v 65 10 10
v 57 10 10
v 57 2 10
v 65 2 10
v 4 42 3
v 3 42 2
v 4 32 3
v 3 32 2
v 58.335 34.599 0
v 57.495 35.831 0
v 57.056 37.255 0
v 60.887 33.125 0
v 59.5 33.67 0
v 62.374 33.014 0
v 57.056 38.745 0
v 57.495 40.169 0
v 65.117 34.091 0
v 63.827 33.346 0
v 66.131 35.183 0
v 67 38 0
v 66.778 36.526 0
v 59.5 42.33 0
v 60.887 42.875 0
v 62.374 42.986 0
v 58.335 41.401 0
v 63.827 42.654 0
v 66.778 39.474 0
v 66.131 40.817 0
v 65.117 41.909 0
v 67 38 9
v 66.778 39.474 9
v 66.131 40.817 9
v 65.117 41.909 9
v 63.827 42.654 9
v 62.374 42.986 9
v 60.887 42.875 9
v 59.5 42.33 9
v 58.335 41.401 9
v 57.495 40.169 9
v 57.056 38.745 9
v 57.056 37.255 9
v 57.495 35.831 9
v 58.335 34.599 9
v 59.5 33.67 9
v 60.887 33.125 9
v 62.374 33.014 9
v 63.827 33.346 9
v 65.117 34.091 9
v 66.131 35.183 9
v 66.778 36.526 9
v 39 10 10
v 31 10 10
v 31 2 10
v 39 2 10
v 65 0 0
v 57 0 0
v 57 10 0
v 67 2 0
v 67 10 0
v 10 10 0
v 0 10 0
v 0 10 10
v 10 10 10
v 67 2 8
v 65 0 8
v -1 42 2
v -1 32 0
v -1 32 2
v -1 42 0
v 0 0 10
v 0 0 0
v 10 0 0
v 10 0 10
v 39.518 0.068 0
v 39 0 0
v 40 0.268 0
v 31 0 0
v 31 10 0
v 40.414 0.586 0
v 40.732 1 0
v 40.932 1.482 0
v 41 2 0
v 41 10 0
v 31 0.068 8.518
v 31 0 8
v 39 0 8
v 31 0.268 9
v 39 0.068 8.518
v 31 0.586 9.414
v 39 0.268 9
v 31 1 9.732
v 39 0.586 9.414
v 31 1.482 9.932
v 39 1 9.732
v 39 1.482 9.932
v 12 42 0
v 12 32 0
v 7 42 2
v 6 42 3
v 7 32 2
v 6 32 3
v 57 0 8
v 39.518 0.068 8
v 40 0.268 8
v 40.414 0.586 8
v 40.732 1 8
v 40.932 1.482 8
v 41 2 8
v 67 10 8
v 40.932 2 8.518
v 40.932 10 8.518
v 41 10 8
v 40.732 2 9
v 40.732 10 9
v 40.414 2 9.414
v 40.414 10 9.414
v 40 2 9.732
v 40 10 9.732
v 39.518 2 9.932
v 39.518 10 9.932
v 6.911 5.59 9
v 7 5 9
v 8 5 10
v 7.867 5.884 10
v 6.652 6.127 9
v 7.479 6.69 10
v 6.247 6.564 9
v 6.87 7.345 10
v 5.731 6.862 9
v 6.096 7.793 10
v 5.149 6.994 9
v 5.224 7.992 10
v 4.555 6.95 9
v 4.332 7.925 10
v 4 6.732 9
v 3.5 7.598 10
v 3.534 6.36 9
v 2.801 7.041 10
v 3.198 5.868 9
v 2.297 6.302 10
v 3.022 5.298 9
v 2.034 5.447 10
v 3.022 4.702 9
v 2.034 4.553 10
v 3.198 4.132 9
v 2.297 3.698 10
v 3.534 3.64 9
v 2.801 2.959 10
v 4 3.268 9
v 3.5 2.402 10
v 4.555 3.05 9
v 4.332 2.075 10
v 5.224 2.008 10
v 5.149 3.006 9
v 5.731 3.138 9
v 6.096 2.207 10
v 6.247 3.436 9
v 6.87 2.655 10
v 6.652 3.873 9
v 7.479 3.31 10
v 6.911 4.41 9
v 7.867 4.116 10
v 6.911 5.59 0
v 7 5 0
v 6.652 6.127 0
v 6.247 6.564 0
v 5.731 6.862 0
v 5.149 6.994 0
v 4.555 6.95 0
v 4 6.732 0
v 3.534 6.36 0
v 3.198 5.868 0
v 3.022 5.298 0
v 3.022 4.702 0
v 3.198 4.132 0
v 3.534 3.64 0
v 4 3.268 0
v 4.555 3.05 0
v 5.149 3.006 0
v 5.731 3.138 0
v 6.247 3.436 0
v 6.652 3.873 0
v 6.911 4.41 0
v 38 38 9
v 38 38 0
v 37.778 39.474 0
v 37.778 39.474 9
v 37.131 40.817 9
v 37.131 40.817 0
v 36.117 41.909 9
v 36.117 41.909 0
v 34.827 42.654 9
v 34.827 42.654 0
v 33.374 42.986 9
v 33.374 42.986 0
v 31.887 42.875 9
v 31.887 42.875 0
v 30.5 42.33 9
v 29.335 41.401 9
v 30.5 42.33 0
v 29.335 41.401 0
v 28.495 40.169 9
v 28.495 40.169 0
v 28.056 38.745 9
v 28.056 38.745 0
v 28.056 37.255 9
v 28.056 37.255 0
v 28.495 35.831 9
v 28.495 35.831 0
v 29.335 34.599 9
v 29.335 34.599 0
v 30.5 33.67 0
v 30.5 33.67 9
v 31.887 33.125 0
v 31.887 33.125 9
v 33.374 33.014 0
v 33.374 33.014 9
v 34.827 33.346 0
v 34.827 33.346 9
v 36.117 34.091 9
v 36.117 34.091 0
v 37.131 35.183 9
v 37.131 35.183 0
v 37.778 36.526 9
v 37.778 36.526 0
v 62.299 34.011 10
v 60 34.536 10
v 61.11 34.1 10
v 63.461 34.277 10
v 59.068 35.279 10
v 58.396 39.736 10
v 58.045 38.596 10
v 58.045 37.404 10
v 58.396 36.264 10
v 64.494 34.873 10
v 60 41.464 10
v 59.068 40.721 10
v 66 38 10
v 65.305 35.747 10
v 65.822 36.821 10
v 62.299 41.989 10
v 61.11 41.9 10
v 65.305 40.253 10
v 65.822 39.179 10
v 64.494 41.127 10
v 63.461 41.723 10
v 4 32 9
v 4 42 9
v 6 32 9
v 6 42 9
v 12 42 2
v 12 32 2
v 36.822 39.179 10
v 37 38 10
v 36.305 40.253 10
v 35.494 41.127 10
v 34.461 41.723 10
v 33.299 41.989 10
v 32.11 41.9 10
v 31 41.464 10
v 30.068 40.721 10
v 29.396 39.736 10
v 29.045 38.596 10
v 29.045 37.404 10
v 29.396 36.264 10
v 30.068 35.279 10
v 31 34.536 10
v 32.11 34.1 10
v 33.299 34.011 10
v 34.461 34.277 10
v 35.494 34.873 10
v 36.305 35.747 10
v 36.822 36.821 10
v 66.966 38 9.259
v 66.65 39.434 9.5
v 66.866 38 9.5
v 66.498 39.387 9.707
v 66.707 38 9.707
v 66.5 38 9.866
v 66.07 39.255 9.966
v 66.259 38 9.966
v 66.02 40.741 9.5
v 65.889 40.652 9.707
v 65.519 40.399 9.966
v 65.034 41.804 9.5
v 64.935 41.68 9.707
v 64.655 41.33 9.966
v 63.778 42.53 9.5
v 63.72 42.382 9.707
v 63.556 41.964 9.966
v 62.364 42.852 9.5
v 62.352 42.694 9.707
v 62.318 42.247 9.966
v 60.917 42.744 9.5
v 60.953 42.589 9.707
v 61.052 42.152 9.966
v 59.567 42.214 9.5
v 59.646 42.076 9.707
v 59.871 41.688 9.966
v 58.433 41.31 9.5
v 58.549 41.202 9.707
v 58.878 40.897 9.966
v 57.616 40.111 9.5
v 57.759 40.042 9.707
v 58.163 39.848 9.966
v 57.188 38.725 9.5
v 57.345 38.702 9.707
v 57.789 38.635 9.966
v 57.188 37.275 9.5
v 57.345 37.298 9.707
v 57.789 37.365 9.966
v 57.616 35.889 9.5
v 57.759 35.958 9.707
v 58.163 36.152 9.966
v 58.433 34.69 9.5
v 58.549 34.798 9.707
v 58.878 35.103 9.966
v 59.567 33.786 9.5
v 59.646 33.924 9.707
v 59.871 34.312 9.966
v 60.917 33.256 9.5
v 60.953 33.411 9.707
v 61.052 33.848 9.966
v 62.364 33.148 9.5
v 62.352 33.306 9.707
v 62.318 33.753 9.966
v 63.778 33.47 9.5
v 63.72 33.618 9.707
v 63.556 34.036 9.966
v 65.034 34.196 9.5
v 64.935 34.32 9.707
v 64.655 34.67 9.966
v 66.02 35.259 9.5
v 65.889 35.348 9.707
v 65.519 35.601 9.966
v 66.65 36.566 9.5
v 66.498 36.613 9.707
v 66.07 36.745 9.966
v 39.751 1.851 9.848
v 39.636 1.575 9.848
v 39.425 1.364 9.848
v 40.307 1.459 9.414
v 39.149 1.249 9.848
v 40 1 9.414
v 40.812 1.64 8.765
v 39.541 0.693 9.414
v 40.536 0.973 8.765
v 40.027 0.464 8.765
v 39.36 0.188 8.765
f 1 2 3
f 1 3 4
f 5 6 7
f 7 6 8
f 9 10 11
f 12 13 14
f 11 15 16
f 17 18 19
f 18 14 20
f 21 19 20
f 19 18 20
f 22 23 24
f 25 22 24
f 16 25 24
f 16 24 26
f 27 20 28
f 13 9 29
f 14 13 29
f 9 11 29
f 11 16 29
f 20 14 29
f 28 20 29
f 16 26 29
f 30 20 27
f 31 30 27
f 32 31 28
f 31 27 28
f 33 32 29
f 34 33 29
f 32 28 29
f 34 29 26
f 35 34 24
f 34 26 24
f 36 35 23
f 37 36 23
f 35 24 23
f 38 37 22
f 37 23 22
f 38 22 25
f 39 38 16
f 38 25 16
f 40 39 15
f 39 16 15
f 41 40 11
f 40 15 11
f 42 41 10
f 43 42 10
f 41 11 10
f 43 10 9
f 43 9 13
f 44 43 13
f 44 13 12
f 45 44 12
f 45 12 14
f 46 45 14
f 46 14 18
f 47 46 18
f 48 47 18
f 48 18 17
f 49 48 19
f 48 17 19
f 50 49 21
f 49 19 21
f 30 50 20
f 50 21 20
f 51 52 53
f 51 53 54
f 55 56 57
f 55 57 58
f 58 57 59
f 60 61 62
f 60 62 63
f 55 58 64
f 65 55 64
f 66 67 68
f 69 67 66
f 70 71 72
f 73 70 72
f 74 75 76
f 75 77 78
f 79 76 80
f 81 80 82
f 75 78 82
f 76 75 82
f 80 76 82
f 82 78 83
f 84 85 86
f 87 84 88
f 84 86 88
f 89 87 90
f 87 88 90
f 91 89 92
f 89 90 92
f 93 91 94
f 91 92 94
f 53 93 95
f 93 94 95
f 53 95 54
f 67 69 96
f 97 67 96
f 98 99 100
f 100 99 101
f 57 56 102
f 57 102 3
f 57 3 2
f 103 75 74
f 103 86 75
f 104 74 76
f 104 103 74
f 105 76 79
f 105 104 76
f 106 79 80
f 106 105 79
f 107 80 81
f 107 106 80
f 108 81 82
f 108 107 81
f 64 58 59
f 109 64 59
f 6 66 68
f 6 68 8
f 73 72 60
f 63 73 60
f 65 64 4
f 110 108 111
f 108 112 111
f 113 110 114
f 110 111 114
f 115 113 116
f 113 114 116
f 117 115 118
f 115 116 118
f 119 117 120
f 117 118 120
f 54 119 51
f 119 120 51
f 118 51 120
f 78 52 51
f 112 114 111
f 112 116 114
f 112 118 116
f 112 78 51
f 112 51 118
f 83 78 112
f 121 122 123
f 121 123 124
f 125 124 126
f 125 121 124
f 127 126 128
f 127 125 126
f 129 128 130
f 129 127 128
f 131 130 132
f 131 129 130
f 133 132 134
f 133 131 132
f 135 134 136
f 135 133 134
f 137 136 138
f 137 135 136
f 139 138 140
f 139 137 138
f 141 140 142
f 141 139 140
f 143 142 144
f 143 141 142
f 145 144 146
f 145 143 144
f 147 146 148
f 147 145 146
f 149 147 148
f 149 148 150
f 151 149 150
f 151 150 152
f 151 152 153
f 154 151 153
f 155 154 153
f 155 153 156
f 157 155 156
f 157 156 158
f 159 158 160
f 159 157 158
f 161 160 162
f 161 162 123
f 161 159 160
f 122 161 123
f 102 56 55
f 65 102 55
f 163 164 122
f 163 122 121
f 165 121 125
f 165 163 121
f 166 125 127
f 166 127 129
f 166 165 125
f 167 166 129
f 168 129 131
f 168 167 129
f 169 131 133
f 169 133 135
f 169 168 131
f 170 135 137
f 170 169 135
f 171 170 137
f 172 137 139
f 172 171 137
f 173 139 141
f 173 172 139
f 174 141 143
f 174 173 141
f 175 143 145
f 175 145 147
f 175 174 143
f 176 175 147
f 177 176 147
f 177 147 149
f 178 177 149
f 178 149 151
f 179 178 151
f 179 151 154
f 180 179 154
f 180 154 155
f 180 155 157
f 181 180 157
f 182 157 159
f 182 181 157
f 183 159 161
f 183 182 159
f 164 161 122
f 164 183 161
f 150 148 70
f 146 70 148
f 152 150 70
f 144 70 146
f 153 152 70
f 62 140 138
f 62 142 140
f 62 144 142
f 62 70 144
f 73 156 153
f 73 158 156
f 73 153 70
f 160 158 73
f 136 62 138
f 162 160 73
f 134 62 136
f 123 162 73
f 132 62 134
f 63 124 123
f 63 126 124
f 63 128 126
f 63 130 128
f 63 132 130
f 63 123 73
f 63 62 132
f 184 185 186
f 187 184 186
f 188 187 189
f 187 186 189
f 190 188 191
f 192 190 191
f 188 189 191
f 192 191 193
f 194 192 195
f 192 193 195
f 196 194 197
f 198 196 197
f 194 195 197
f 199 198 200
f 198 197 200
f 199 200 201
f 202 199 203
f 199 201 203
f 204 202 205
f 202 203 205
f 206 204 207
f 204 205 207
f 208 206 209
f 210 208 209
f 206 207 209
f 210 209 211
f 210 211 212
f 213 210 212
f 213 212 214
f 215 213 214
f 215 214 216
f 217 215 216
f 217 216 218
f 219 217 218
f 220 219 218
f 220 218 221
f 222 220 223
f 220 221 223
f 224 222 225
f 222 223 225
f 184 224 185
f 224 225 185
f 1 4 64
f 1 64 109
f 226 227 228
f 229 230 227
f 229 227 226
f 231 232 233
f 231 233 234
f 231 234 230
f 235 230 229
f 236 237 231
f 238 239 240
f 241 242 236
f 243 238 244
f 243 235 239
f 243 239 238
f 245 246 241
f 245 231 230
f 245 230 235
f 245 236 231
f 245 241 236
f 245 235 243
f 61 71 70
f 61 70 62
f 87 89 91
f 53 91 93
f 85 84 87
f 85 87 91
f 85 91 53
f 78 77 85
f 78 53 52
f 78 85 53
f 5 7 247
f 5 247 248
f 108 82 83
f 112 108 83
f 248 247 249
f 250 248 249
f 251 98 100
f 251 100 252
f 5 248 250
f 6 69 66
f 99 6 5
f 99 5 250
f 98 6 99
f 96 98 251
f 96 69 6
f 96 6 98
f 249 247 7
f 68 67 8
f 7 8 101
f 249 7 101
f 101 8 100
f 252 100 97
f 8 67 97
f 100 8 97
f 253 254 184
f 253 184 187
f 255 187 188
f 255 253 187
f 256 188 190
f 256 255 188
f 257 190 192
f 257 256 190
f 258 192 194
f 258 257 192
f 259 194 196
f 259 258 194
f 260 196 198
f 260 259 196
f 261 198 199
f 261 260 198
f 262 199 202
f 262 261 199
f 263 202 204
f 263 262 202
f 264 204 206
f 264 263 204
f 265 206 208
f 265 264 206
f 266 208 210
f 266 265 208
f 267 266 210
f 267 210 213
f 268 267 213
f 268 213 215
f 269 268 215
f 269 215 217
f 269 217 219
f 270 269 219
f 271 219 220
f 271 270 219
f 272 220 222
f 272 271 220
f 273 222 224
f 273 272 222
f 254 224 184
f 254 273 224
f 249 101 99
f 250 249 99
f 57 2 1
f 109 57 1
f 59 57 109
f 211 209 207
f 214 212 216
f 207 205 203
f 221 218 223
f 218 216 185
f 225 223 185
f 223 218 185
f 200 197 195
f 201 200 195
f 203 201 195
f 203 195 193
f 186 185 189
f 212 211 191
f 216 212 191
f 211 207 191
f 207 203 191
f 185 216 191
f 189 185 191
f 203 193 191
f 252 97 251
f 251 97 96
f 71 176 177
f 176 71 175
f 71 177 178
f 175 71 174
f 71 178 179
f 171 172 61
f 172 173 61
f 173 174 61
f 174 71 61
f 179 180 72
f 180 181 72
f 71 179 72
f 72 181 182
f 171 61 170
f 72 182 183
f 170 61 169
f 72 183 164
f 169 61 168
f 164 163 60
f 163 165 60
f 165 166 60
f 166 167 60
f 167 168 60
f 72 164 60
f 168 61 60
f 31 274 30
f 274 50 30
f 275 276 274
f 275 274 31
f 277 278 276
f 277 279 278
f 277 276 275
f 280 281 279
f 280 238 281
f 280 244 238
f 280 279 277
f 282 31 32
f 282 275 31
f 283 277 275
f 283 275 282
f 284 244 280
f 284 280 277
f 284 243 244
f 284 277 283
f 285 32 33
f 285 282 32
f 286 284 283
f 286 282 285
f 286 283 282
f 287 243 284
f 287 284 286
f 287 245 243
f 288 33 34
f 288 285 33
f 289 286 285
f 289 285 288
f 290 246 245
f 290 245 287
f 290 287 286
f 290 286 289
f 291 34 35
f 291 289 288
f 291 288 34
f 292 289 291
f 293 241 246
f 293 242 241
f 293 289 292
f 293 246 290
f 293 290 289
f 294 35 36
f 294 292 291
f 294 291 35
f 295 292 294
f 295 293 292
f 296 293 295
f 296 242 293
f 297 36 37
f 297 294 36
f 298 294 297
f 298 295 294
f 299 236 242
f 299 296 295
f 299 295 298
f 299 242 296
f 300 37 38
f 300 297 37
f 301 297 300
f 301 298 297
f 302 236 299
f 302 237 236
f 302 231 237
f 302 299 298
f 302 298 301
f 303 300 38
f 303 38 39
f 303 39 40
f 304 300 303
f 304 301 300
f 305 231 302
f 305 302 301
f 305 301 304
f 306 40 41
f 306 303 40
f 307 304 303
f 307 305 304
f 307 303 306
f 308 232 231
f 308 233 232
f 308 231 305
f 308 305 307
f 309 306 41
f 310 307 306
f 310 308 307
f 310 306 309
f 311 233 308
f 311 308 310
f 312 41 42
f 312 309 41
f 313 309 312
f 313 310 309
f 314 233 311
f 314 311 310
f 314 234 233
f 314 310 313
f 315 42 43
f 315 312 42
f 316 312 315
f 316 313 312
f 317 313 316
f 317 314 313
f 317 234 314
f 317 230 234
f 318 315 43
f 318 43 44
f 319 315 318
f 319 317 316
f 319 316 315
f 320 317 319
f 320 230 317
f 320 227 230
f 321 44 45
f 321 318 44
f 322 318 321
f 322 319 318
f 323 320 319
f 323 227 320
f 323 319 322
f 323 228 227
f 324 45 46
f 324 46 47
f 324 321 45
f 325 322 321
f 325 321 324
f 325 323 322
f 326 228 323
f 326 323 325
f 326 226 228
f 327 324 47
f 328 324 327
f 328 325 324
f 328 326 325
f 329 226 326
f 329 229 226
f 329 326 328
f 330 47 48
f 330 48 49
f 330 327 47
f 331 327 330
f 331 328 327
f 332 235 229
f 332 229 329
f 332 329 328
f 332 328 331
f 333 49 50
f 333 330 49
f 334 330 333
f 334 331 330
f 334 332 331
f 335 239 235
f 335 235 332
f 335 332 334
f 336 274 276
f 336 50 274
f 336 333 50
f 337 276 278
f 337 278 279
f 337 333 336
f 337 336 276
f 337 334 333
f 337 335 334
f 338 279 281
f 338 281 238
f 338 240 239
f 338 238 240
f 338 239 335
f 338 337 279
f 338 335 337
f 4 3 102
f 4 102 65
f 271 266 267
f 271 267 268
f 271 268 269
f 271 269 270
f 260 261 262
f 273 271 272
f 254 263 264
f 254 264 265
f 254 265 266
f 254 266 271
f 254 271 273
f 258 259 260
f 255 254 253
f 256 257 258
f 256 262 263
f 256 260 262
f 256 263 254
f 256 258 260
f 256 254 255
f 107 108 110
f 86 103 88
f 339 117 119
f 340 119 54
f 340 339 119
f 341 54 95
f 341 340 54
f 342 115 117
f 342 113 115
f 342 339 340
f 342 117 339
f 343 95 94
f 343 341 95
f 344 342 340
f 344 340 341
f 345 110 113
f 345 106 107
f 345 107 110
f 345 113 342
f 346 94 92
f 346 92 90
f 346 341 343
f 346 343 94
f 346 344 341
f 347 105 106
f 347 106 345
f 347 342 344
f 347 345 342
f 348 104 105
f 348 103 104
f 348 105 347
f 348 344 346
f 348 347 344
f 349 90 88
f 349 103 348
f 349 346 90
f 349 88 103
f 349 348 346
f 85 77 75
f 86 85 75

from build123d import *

# Parameters (mm, degrees)
BOX_W           = 10
BOX_H           = 10
BOX_DEPTH       = 10
FILLET_R        = 2
BOX001_W        = 10
BOX001_H        = 10
BOX001_DEPTH    = 10
CHAMFER_SIZE    = 2
TUBE_R          = 2
TUBE_DEPTH      = 10
BOX002_W        = 10
BOX002_H        = 10
BOX002_DEPTH    = 10
CHAMFER001_SIZE = 1
TUBE001_R       = 5
TUBE001_DEPTH   = 10
FILLET001_R     = 1
TUBE002_R       = 5
TUBE002_DEPTH   = 10
CHAMFER002_SIZE = 1
BOX004_W        = 2
BOX004_H        = 10
BOX004_DEPTH    = 9
BOX003_W        = 13
BOX003_H        = 10
BOX003_DEPTH    = 2
CHAMFER003_SIZE = 1
CHAMFER004_SIZE = 1


with BuildPart() as fillet_body:
    # Box → Box (new body)
    with BuildSketch(Plane(origin=(31, 0, 0), x_dir=(1, 0, 0), z_dir=(0, 0, 1))):
        with Locations((5, 5)):
            Rectangle(BOX_W, BOX_H)
    extrude(amount=BOX_DEPTH)

    # Fillet
    fillet_edges = [fillet_body.edges().sort_by_distance(p)[0] for p in [
        (41, 0, 5),
        (41, 5, 10),
        (36, 0, 10),
    ]]
    fillet(fillet_edges, radius=FILLET_R)


with BuildPart() as chamfer_body:
    # Box001 → Box001 (new body)
    with BuildSketch(Plane(origin=(57, 0, 0), x_dir=(1, 0, 0), z_dir=(0, 0, 1))):
        with Locations((5, 5)):
            Rectangle(BOX001_W, BOX001_H)
    extrude(amount=BOX001_DEPTH)

    # Chamfer
    chamfer_edges = [chamfer_body.edges().sort_by_distance(p)[0] for p in [
        (67, 0, 5),
        (67, 5, 10),
        (62, 0, 10),
    ]]
    chamfer(chamfer_edges, length=CHAMFER_SIZE)


with BuildPart() as tube:
    # Tube → Tube (new body)
    with BuildSketch(Plane(origin=(5, 5, 0), x_dir=(1, 0, 0), z_dir=(0, 0, 1))):
        Circle(TUBE_R)
    extrude(amount=TUBE_DEPTH)


with BuildPart() as chamfer001:
    # Box002 → Box002 (new body)
    with BuildSketch(Plane.XY):
        with Locations((5, 5)):
            Rectangle(BOX002_W, BOX002_H)
    extrude(amount=BOX002_DEPTH)

    # Cut: cut Tube
    add(tube.part, mode=Mode.SUBTRACT)

    # Chamfer001
    chamfer001_edges = [chamfer001.edges().sort_by_distance(p)[0] for p in [
        (3, 5, 10),
    ]]
    chamfer(chamfer001_edges, length=CHAMFER001_SIZE)


with BuildPart() as fillet001:
    # Tube001 → Tube001 (new body)
    with BuildSketch(Plane(origin=(62, 38, 0), x_dir=(1, 0, 0), z_dir=(0, 0, 1))):
        Circle(TUBE001_R)
    extrude(amount=TUBE001_DEPTH)

    # Fillet001
    fillet001_edges = [fillet001.edges().sort_by_distance(p)[0] for p in [
        (57, 38, 10),
    ]]
    fillet(fillet001_edges, radius=FILLET001_R)


with BuildPart() as chamfer002:
    # Tube002 → Tube002 (new body)
    with BuildSketch(Plane(origin=(33, 38, 0), x_dir=(1, 0, 0), z_dir=(0, 0, 1))):
        Circle(TUBE002_R)
    extrude(amount=TUBE002_DEPTH)

    # Chamfer002
    chamfer002_edges = [chamfer002.edges().sort_by_distance(p)[0] for p in [
        (28, 38, 10),
    ]]
    chamfer(chamfer002_edges, length=CHAMFER002_SIZE)


with BuildPart() as cub004:
    # Box004 → Box004 (new body)
    with BuildSketch(Plane(origin=(4, 32, 0), x_dir=(1, 0, 0), z_dir=(0, 0, 1))):
        with Locations((1, 5)):
            Rectangle(BOX004_W, BOX004_H)
    extrude(amount=BOX004_DEPTH)


with BuildPart() as chamfer004:
    # Box003 → Box003 (new body)
    with BuildSketch(Plane(origin=(-1, 32, 0), x_dir=(1, 0, 0), z_dir=(0, 0, 1))):
        with Locations((6.5, 5)):
            Rectangle(BOX003_W, BOX003_H)
    extrude(amount=BOX003_DEPTH)

    # Fusion: union Cub004
    add(cub004.part)

    # Chamfer003
    chamfer003_edges = [chamfer004.edges().sort_by_distance(p)[0] for p in [
        (6, 37, 2),
    ]]
    chamfer(chamfer003_edges, length=CHAMFER003_SIZE)

    # Chamfer004
    chamfer004_edges = [chamfer004.edges().sort_by_distance(p)[0] for p in [
        (4, 37, 2),
    ]]
    chamfer(chamfer004_edges, length=CHAMFER004_SIZE)


solid = Compound([fillet_body.part, chamfer_body.part, chamfer001.part, fillet001.part, chamfer002.part, chamfer004.part])
